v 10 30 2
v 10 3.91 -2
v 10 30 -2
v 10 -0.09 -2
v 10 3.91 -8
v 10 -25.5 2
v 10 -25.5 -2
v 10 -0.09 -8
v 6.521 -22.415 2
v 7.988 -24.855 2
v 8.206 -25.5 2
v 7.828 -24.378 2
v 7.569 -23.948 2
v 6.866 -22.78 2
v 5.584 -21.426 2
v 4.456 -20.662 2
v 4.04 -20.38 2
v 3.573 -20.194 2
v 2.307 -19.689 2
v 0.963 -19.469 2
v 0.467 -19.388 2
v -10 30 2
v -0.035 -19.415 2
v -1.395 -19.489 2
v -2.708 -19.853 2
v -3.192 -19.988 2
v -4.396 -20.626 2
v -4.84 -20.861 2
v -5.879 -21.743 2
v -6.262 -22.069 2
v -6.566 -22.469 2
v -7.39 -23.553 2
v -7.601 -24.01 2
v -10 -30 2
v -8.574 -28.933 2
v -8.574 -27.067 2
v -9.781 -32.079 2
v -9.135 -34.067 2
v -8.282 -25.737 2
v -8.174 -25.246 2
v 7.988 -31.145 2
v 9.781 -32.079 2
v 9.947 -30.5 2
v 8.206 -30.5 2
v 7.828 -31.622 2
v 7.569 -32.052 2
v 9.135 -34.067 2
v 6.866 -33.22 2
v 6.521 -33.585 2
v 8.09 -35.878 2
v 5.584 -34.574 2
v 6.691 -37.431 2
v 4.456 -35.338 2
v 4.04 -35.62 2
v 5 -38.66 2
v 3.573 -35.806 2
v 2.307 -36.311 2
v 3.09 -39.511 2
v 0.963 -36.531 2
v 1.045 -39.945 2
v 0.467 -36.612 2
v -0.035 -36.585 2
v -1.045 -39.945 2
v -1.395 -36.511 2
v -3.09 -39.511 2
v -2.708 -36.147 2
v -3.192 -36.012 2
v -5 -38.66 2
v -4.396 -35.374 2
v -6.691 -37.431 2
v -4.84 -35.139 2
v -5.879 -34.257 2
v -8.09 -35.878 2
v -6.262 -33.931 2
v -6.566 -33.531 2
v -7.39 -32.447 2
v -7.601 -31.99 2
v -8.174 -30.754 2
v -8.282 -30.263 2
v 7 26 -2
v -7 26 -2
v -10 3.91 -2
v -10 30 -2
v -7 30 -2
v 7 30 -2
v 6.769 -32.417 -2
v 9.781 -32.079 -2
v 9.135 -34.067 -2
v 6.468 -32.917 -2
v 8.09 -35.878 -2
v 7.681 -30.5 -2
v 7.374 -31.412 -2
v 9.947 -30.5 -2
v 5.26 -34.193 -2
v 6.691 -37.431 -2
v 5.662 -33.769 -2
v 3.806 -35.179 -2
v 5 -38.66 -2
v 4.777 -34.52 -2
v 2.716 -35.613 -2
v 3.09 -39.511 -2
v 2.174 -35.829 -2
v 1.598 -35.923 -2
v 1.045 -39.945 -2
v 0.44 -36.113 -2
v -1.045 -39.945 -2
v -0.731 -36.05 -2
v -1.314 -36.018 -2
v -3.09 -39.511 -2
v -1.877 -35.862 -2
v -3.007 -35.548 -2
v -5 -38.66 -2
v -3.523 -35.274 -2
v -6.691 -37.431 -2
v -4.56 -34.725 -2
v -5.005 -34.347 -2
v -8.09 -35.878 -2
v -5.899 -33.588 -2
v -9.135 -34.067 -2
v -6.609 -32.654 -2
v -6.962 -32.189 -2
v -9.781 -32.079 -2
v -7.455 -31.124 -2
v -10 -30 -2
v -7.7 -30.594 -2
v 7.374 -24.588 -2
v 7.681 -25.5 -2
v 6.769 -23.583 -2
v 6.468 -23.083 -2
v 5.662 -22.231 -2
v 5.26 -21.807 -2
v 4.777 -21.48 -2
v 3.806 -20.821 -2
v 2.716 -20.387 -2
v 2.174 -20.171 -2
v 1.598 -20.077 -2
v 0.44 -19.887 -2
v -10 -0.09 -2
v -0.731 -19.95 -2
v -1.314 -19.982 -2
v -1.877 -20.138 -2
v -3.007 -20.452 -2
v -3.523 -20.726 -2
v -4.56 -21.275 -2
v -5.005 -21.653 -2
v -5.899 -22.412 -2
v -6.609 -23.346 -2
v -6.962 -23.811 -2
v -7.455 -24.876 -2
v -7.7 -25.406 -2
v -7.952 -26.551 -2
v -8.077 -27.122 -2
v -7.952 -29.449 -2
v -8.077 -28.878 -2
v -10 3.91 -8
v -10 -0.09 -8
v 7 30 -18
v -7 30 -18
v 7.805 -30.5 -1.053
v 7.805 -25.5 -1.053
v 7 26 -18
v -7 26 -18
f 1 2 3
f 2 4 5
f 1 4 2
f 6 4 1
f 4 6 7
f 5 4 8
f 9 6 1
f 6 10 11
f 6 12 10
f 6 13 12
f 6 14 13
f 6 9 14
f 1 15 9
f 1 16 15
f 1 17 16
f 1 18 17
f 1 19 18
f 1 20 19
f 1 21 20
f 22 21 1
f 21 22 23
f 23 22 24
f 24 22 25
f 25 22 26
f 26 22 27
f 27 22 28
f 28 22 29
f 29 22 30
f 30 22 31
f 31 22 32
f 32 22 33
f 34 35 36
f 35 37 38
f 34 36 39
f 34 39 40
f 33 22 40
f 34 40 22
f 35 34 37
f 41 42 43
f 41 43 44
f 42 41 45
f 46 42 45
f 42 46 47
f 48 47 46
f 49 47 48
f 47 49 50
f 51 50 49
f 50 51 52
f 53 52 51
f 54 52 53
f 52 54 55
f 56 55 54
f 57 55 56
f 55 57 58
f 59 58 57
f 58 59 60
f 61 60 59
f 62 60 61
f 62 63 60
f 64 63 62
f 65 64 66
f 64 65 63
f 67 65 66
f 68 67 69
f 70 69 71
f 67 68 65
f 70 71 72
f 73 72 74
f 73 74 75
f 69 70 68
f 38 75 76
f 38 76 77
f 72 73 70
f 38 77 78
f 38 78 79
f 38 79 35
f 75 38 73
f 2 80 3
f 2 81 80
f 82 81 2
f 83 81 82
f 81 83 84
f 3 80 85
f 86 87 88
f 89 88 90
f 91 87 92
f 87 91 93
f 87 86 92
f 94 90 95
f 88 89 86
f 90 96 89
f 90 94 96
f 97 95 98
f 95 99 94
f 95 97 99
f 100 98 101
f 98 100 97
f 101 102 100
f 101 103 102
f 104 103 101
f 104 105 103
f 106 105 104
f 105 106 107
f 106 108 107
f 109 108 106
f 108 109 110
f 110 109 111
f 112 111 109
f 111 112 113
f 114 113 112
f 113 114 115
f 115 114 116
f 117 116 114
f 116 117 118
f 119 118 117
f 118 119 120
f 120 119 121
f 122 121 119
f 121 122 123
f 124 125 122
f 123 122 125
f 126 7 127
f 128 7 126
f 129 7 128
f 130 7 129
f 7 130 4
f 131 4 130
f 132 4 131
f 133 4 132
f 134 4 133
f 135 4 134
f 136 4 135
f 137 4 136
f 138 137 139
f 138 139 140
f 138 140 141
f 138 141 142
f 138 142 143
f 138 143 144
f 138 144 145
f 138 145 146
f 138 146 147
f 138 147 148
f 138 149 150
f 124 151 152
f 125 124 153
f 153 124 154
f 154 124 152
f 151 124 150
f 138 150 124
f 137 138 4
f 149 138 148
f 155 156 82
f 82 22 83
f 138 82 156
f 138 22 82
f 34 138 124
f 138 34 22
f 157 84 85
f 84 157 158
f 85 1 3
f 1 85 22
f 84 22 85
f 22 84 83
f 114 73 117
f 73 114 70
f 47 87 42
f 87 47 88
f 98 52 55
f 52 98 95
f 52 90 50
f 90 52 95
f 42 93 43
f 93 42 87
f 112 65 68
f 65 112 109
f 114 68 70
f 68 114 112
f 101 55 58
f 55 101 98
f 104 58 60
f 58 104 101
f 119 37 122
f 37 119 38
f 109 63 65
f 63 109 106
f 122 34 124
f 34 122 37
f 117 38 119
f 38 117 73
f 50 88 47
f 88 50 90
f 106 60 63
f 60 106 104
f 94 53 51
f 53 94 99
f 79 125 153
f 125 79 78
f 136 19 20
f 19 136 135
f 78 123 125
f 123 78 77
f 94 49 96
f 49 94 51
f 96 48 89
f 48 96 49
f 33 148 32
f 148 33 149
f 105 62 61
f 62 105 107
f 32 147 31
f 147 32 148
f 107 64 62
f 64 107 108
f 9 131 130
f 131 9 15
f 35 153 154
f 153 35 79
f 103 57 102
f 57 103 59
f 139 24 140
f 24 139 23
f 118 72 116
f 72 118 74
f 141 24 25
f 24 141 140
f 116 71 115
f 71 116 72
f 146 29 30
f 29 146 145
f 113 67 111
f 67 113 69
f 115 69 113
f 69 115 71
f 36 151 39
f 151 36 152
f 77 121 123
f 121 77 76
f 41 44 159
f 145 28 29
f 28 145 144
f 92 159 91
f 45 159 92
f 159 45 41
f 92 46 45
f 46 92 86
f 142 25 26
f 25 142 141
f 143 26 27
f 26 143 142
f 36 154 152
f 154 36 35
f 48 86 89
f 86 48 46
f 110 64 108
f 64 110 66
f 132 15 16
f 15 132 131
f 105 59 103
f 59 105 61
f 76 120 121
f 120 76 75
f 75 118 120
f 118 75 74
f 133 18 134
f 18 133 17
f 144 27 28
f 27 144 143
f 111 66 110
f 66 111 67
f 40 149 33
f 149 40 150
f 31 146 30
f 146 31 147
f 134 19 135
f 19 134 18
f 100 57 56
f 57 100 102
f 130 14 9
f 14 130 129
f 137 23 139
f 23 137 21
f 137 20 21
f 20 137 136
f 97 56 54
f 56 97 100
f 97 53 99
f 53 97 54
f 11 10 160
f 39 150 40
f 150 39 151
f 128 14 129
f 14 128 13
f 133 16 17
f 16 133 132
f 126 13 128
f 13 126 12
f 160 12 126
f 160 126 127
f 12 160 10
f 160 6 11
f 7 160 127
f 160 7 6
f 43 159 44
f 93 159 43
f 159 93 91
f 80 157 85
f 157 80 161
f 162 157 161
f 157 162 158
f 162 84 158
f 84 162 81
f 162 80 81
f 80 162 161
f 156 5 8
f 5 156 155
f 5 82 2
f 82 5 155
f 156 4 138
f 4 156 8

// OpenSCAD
armlength=60;
armthick=4;
hookdepth=20;
width=20;
armspace=28.09;
wire=5;
doorhook=14;

difference(){
    
    union(){
    cube([width,armlength,  armthick], center=true);
    translate([0,-1*armlength/2,0])   
    cylinder(armthick,width/2,width/2, center=true);
    }
    
    union(){
    translate([0,-1*armlength/2+2,0])
        cylinder(10,15.5/2,18/2, center=true);
    translate([width/2,-1*armlength/2+2,0])
        cube([width/2,wire,armthick*2],center=true);
    }
}
translate([0,armlength/2-armthick/2,-1*(hookdepth/2-armthick/2)])
		cube([doorhook,armthick,hookdepth],center=true);

translate([0,armlength/2-armspace,-1*((hookdepth/2)/2-armthick/2)])
    cube([width,armthick,hookdepth/2],center=true);
